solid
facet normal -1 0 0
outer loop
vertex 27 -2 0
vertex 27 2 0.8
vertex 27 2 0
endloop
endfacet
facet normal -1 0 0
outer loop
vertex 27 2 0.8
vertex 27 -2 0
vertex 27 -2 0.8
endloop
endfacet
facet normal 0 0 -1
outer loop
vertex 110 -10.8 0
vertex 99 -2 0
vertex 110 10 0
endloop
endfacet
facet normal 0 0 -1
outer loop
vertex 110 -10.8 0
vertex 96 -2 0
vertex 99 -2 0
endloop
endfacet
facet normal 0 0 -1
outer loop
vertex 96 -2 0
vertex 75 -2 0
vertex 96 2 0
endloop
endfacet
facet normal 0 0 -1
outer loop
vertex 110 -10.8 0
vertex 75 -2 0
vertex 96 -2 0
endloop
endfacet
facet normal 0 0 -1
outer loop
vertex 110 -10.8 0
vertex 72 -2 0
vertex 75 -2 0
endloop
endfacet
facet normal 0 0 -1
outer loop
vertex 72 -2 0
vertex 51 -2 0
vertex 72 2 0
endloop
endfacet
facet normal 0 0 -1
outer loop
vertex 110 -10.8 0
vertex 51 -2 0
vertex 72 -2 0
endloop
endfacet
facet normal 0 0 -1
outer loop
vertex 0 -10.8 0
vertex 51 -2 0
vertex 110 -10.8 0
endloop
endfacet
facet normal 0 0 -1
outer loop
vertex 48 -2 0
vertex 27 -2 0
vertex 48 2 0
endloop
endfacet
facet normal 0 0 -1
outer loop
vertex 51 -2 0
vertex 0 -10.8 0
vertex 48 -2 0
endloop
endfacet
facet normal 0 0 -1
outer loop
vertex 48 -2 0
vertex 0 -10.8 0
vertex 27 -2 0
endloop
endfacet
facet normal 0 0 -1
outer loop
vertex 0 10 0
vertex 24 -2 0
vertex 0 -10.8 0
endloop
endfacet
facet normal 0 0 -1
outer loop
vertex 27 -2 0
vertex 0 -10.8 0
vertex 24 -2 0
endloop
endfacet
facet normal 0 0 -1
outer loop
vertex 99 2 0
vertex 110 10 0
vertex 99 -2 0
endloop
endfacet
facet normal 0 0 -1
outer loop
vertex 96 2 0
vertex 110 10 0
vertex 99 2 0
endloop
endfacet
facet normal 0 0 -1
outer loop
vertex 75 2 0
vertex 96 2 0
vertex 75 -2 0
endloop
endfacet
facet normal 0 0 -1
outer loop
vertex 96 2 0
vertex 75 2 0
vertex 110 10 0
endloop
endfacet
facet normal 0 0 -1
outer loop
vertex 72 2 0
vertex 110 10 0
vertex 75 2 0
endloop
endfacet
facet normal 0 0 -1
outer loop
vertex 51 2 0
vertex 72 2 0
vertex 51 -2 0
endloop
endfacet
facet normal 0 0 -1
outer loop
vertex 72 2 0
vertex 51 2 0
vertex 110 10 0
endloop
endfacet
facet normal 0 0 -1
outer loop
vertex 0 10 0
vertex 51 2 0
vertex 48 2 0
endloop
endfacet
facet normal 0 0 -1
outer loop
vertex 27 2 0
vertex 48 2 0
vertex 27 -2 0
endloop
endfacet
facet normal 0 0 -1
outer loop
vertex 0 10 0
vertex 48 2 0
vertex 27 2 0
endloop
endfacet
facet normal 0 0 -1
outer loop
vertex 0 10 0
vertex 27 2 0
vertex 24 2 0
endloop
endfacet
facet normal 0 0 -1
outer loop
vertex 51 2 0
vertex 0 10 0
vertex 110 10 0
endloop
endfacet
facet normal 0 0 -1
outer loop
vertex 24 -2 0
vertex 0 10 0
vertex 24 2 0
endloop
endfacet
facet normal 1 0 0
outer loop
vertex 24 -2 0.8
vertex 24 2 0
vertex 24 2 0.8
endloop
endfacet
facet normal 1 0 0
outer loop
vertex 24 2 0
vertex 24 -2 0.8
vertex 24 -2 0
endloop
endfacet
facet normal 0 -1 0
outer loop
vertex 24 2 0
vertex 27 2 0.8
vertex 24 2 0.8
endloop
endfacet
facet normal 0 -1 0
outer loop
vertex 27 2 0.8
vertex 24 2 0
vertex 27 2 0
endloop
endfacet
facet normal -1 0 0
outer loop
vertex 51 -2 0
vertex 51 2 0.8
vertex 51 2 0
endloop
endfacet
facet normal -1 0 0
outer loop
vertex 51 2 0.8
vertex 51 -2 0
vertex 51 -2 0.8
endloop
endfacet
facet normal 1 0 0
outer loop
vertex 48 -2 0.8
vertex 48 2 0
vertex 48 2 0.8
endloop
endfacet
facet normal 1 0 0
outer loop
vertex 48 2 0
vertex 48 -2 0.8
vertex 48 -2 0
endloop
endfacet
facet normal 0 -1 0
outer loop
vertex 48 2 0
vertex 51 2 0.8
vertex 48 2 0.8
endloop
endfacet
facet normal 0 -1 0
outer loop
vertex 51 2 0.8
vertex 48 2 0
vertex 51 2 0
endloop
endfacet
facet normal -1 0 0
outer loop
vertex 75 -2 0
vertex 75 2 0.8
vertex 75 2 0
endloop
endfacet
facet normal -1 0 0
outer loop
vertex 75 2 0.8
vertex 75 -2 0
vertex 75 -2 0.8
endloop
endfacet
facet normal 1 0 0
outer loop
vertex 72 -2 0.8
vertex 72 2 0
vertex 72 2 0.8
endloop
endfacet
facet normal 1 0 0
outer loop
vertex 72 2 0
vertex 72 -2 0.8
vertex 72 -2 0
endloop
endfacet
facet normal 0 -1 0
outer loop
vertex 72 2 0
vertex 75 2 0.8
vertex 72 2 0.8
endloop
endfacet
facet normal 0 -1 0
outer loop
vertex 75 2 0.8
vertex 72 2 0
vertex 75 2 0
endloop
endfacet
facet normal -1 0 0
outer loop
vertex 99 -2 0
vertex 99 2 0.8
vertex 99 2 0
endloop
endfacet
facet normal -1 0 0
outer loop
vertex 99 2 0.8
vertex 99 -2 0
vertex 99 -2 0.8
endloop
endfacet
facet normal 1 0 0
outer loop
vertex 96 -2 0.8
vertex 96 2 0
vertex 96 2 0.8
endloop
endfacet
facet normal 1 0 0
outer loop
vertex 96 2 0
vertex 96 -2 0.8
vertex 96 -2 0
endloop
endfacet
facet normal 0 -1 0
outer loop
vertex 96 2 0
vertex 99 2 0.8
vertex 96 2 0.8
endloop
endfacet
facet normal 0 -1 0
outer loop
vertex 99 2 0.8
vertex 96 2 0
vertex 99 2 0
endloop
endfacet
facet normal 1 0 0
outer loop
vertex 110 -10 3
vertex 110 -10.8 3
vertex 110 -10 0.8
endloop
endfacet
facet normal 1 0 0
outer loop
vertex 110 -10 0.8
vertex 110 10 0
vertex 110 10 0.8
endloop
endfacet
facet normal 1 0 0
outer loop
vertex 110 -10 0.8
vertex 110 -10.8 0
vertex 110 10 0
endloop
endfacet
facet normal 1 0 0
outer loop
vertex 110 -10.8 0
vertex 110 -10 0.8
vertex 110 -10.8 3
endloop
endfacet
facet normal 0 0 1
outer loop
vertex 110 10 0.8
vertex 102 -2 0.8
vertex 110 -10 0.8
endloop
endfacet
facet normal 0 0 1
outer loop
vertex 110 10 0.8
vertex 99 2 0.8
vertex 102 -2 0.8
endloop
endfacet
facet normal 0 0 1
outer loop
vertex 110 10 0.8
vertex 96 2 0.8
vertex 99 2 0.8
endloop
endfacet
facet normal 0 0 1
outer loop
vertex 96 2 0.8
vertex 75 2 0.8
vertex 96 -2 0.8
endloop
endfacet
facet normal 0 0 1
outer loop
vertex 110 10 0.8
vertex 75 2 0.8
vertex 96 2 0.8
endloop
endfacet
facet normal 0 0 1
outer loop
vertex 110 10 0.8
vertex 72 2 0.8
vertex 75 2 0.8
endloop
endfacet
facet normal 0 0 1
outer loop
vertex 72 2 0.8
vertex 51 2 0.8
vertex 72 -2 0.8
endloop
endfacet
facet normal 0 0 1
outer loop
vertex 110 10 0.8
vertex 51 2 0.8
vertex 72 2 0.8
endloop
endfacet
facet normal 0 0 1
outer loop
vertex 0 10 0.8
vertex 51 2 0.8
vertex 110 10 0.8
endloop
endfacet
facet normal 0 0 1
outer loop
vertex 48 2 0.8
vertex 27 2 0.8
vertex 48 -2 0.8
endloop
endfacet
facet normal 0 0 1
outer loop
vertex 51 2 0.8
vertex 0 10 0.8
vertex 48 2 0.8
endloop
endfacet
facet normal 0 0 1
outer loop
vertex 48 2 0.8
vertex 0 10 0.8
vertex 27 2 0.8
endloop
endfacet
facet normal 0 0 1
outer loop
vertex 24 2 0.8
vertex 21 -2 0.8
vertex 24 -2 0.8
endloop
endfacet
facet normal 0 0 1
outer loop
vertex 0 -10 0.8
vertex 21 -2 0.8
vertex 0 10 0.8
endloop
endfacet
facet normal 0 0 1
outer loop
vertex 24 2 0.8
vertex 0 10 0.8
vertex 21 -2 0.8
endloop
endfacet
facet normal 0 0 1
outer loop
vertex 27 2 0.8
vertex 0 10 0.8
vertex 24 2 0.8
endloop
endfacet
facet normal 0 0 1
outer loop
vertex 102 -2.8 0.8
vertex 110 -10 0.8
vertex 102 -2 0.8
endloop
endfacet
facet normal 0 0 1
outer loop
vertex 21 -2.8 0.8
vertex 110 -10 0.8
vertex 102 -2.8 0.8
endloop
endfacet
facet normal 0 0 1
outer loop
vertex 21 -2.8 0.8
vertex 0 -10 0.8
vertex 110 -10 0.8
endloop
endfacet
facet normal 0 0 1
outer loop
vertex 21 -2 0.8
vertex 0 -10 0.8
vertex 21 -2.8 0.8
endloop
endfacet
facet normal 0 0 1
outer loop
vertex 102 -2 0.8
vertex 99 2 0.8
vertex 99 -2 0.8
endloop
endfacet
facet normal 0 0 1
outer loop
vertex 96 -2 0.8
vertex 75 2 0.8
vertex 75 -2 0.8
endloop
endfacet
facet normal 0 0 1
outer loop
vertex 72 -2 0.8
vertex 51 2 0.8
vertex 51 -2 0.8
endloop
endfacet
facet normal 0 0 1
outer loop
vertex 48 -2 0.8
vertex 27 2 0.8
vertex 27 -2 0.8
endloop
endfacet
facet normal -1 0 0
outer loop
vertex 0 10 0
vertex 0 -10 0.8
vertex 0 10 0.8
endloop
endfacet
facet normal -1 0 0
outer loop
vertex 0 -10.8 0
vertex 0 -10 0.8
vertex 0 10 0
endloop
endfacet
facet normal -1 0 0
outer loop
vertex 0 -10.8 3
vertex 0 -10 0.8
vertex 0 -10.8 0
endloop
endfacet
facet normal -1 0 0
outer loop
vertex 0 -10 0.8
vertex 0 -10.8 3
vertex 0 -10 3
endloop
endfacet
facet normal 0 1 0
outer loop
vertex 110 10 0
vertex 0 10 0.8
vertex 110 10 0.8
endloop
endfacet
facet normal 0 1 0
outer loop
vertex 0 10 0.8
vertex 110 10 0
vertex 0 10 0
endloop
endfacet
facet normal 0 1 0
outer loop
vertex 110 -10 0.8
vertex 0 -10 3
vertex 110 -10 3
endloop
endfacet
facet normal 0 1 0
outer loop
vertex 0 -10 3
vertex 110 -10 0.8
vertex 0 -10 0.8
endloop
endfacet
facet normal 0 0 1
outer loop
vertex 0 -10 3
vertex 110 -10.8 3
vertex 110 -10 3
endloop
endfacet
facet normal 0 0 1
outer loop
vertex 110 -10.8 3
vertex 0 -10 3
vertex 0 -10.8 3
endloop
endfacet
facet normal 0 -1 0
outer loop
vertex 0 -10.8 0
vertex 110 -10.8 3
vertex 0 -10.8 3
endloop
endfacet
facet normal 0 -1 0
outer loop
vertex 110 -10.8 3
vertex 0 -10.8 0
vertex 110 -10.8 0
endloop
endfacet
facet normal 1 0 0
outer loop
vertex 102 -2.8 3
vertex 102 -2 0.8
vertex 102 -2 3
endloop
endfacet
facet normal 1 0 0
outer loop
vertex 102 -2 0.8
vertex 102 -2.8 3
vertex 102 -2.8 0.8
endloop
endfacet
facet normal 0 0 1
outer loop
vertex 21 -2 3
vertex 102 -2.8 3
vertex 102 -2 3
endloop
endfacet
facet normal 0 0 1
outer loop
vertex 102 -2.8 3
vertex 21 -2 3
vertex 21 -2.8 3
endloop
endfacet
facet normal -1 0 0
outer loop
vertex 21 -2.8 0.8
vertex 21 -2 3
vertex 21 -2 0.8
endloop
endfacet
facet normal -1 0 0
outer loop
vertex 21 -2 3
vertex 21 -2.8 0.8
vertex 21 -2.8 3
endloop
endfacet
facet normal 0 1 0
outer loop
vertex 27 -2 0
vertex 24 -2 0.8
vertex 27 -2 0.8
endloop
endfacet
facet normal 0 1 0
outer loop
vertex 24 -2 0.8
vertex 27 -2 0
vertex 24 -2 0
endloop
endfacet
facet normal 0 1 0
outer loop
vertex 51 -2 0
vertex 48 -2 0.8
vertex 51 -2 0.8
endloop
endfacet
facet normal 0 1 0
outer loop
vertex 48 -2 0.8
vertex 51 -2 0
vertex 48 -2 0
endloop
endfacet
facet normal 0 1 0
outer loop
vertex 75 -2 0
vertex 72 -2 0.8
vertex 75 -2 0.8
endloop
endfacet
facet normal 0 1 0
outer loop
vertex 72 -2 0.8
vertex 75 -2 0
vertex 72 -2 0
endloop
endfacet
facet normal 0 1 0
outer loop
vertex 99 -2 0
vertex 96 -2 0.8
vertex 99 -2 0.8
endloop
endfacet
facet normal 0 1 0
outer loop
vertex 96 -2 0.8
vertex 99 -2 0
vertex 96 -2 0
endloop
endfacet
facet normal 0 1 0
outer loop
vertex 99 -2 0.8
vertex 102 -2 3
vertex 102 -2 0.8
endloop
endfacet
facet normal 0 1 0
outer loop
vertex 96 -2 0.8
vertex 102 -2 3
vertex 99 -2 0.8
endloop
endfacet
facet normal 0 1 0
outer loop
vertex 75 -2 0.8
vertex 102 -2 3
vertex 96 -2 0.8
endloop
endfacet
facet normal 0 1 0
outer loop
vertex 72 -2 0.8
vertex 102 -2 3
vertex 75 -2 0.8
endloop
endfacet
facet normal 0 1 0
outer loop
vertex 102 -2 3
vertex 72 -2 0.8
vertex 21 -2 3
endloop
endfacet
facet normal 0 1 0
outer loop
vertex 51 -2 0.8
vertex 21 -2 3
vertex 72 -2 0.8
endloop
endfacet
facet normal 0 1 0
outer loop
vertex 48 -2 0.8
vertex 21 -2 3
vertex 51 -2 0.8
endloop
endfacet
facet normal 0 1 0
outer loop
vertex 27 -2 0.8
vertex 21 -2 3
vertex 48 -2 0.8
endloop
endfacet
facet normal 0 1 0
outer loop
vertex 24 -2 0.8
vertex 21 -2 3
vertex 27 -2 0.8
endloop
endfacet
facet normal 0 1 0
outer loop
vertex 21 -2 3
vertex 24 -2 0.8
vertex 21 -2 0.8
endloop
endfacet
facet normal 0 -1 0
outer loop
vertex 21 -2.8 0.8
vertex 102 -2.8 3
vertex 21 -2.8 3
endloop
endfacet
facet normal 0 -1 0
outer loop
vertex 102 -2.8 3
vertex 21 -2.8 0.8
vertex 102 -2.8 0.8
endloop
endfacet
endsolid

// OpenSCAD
module plate() {
    difference() {
        translate([0,-10,0]) cube([110,20,0.8]);
        for (offset = [24:24:110]) {
            translate([offset,-2,0]) cube([3,4,1]);
        }
    }
    translate([0,-10.8,0]) cube([110,0.8,3]);
    translate([21,-2.8,0]) cube([81,0.8,3]);
}
plate();
